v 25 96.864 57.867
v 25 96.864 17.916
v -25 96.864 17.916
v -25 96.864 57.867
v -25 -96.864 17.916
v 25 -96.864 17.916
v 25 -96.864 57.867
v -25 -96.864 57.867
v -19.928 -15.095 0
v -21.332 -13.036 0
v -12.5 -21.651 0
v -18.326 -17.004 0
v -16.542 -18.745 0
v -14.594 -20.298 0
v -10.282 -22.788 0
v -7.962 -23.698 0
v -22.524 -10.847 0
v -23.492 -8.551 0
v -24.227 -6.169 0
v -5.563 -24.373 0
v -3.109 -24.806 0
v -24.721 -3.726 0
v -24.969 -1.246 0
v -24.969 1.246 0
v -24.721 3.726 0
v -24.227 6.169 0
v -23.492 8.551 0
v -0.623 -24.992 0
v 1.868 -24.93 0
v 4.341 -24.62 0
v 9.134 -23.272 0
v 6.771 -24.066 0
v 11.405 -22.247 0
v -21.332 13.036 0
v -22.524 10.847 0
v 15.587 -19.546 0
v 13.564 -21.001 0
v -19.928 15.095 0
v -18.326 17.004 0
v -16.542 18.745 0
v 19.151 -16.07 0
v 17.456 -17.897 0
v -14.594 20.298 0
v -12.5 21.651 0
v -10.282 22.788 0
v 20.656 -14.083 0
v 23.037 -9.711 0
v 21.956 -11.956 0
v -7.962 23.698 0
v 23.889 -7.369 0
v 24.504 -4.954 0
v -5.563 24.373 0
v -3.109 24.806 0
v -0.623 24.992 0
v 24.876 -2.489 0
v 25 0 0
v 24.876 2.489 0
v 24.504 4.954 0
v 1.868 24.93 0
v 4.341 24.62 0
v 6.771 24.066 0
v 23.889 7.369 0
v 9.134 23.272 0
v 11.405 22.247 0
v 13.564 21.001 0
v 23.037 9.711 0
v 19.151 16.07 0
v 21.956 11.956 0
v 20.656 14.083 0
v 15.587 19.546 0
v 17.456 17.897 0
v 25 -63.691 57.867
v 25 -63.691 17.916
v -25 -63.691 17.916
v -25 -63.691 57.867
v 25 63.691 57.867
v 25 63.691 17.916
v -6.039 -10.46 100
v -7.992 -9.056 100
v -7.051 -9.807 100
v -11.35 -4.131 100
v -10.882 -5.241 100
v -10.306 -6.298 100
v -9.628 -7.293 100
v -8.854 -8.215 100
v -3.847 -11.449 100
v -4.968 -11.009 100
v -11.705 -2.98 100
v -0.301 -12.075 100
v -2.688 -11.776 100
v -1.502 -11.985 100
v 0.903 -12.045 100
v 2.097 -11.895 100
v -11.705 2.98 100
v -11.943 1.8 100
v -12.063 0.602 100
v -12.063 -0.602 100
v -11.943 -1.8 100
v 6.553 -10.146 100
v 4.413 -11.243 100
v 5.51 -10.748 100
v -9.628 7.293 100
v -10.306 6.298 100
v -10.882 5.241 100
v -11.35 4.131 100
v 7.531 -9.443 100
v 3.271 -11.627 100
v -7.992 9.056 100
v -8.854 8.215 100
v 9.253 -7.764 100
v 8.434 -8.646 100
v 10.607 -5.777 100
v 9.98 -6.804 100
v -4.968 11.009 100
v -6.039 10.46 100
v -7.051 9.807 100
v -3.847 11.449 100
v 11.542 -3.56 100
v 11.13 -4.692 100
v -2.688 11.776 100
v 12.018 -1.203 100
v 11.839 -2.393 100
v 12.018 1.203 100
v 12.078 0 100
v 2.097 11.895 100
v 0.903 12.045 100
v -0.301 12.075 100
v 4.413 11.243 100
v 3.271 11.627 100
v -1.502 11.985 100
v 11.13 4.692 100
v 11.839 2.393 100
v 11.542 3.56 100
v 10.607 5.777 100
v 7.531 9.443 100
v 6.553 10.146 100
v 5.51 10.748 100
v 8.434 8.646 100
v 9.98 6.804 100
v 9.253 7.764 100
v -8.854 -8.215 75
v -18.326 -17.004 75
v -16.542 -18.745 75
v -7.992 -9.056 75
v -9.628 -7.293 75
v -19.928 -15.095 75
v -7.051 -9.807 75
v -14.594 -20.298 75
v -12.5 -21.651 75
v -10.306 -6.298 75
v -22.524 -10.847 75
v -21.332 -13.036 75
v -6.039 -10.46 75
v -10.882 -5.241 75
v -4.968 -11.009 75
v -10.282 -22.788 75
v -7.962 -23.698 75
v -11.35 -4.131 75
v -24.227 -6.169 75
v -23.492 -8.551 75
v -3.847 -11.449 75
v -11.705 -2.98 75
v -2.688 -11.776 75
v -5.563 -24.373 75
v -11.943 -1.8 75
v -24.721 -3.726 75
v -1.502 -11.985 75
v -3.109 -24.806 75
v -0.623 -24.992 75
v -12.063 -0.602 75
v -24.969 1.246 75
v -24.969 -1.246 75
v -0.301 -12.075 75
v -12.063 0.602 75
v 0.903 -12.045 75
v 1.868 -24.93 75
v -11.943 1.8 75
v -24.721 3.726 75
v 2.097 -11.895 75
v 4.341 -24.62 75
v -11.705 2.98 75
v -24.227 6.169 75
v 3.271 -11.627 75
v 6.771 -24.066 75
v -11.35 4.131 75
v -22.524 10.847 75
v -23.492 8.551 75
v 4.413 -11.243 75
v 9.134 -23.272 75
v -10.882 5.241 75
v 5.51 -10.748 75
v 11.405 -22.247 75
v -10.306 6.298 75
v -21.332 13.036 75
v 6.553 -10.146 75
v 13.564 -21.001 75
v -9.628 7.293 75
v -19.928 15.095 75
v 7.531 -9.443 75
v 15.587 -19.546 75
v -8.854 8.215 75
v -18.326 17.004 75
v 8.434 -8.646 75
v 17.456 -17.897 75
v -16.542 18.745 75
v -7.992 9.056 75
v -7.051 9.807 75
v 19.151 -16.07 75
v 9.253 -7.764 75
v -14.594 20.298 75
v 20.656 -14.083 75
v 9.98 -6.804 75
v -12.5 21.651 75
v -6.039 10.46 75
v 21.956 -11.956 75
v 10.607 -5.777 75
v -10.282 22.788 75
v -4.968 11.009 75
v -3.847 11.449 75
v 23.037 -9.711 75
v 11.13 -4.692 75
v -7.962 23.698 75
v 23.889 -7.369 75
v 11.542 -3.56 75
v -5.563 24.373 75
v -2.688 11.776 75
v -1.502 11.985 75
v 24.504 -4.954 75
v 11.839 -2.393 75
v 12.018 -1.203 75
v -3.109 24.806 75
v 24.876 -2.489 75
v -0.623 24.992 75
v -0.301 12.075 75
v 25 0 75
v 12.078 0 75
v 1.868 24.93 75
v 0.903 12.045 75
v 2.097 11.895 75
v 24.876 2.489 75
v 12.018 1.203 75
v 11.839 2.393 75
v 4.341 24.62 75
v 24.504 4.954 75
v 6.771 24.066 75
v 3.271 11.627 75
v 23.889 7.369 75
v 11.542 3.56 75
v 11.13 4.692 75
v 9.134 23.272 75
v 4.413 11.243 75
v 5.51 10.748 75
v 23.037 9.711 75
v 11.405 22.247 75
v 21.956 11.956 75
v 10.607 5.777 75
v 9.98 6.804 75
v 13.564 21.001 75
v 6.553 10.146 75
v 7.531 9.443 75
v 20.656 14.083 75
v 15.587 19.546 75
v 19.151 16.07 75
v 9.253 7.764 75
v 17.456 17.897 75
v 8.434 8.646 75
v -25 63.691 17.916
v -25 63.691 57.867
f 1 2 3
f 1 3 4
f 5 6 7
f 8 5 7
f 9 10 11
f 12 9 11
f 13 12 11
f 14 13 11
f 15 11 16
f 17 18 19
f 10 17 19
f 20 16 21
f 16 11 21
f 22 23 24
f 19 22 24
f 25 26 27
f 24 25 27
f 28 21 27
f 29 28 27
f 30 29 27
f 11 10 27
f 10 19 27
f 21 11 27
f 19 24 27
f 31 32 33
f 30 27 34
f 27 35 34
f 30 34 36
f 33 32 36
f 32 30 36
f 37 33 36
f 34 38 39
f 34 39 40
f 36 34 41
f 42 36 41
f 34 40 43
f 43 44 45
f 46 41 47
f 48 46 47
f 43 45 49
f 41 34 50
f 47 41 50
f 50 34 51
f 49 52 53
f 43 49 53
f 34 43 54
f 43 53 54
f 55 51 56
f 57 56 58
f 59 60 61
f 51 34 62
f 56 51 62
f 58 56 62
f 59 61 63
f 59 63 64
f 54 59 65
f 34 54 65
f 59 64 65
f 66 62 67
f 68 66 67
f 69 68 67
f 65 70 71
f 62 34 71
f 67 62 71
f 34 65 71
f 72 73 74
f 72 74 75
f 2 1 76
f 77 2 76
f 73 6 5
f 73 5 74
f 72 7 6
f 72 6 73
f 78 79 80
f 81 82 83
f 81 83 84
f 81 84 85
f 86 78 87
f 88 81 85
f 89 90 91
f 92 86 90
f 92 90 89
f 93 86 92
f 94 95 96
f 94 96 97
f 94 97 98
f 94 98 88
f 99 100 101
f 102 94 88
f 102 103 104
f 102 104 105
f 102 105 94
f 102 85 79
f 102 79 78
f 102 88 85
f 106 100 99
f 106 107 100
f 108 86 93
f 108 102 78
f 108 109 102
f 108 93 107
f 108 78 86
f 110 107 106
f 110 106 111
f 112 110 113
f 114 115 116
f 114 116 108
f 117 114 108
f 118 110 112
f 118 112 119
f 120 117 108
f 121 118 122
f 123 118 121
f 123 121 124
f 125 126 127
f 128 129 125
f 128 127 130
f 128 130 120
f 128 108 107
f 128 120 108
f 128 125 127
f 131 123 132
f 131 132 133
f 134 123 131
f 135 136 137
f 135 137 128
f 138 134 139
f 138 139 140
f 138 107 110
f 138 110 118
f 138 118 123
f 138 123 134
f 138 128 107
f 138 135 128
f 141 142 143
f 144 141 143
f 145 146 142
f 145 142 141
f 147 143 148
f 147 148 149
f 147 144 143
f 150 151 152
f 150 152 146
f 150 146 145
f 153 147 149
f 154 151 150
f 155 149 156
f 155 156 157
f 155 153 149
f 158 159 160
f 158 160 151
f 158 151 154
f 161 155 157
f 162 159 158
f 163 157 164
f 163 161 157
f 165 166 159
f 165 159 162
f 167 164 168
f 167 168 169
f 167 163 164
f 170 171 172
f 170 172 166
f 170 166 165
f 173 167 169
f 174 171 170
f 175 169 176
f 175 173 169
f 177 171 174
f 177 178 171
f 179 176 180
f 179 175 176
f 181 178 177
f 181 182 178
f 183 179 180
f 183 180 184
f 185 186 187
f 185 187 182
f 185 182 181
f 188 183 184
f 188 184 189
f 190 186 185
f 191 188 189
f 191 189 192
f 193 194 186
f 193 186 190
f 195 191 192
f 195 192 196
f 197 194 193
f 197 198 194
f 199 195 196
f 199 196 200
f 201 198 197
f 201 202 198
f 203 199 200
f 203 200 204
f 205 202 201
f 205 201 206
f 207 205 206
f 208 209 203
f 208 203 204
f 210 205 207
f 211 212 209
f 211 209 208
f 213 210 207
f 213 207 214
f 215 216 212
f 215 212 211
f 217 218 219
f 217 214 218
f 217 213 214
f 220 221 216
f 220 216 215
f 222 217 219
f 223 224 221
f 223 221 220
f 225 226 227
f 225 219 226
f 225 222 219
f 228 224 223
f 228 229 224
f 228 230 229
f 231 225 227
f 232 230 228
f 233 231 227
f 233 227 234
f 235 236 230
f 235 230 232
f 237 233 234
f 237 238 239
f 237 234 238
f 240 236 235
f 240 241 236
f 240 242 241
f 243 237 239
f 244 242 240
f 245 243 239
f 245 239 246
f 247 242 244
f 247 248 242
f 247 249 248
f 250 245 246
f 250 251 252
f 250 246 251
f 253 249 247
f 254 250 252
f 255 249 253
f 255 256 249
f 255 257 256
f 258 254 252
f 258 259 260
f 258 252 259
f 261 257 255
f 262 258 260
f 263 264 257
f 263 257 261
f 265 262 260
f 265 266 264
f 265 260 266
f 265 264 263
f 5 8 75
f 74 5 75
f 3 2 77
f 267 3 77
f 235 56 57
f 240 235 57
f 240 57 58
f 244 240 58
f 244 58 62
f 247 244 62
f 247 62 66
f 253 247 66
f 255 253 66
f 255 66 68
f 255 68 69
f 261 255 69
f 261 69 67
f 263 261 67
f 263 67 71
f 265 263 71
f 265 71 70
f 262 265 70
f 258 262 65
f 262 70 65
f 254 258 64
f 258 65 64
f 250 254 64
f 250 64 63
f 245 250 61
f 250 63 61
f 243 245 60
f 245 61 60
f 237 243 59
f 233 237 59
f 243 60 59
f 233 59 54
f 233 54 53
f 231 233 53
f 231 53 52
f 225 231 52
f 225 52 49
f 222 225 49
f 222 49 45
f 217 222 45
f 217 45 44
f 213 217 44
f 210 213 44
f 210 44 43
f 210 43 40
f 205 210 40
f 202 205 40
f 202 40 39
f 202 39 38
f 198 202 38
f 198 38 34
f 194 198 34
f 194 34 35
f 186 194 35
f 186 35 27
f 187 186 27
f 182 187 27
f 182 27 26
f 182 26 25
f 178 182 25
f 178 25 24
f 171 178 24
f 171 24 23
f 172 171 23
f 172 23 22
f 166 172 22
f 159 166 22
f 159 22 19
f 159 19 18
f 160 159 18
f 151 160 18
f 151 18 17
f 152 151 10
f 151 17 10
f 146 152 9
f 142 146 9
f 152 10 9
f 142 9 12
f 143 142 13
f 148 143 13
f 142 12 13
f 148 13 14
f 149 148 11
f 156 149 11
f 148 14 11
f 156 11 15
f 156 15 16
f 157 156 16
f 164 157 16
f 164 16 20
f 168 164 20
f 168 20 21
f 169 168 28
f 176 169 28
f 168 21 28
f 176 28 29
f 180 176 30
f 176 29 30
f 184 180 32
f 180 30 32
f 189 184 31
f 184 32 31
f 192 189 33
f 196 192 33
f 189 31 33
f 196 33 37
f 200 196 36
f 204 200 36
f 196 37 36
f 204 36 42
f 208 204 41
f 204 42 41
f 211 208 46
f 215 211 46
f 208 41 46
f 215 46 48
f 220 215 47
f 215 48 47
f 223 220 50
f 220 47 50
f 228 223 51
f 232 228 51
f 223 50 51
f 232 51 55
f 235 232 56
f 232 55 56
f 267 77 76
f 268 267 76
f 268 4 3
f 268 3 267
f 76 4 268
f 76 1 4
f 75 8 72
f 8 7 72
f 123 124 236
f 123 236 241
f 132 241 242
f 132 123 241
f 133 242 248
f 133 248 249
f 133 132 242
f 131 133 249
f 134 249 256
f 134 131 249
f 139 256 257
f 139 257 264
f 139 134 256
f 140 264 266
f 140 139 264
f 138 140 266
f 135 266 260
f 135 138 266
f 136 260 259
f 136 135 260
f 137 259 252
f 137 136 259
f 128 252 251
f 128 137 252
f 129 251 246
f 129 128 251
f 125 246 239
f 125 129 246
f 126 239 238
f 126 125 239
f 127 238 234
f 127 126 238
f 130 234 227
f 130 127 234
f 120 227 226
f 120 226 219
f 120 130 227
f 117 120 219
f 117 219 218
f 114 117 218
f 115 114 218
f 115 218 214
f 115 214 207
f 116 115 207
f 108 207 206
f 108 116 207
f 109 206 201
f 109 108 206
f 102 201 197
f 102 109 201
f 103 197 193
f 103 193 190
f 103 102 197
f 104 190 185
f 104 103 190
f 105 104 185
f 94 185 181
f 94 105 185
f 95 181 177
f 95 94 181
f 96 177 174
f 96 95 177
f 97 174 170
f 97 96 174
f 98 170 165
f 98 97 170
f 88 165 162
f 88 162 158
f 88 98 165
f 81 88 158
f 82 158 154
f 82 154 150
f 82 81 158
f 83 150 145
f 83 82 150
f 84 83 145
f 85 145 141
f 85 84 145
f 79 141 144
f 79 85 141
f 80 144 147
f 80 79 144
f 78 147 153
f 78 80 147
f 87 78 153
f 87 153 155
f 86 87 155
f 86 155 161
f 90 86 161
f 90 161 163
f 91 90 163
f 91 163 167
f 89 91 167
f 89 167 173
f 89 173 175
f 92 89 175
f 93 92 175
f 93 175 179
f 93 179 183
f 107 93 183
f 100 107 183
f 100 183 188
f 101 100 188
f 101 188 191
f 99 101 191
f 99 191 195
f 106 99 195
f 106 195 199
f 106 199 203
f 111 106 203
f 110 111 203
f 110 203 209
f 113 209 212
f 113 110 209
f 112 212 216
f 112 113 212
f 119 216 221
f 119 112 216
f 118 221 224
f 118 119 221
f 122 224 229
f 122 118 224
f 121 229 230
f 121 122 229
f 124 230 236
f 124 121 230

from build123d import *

# Parameters (mm, degrees)
F0_R     = 25
F1_DEPTH = 100
F2_R     = 25
F2_R_2   = 12.078352
F3_DEPTH = 25
F4_W     = 33.172474
F4_H     = 39.95184
F5_DEPTH = 25


with BuildPart() as f1:
    # F0 (on Top) → F1 (new body)
    with BuildSketch(Plane.XY):
        Circle(F0_R)
    extrude(amount=F1_DEPTH)

    # F2 (on face) → F3 (cut)
    with BuildSketch(Plane.XY.offset(100)):
        Circle(F2_R)
        Circle(F2_R_2, mode=Mode.SUBTRACT)
    extrude(amount=-F3_DEPTH, mode=Mode.SUBTRACT)


with BuildPart() as f5:
    # F4 (on Right) → F5 (new body, symmetric)
    with BuildSketch(Plane.YZ):
        with Locations((-80.277376, 37.891547)):
            Rectangle(F4_W, F4_H)
    extrude(amount=F5_DEPTH, both=True)


with BuildPart() as f6_1:
    # F6: instance of F5
    add(f5.part.mirror(Plane.XZ))


solid = Compound([f1.part, f5.part, f6_1.part])
